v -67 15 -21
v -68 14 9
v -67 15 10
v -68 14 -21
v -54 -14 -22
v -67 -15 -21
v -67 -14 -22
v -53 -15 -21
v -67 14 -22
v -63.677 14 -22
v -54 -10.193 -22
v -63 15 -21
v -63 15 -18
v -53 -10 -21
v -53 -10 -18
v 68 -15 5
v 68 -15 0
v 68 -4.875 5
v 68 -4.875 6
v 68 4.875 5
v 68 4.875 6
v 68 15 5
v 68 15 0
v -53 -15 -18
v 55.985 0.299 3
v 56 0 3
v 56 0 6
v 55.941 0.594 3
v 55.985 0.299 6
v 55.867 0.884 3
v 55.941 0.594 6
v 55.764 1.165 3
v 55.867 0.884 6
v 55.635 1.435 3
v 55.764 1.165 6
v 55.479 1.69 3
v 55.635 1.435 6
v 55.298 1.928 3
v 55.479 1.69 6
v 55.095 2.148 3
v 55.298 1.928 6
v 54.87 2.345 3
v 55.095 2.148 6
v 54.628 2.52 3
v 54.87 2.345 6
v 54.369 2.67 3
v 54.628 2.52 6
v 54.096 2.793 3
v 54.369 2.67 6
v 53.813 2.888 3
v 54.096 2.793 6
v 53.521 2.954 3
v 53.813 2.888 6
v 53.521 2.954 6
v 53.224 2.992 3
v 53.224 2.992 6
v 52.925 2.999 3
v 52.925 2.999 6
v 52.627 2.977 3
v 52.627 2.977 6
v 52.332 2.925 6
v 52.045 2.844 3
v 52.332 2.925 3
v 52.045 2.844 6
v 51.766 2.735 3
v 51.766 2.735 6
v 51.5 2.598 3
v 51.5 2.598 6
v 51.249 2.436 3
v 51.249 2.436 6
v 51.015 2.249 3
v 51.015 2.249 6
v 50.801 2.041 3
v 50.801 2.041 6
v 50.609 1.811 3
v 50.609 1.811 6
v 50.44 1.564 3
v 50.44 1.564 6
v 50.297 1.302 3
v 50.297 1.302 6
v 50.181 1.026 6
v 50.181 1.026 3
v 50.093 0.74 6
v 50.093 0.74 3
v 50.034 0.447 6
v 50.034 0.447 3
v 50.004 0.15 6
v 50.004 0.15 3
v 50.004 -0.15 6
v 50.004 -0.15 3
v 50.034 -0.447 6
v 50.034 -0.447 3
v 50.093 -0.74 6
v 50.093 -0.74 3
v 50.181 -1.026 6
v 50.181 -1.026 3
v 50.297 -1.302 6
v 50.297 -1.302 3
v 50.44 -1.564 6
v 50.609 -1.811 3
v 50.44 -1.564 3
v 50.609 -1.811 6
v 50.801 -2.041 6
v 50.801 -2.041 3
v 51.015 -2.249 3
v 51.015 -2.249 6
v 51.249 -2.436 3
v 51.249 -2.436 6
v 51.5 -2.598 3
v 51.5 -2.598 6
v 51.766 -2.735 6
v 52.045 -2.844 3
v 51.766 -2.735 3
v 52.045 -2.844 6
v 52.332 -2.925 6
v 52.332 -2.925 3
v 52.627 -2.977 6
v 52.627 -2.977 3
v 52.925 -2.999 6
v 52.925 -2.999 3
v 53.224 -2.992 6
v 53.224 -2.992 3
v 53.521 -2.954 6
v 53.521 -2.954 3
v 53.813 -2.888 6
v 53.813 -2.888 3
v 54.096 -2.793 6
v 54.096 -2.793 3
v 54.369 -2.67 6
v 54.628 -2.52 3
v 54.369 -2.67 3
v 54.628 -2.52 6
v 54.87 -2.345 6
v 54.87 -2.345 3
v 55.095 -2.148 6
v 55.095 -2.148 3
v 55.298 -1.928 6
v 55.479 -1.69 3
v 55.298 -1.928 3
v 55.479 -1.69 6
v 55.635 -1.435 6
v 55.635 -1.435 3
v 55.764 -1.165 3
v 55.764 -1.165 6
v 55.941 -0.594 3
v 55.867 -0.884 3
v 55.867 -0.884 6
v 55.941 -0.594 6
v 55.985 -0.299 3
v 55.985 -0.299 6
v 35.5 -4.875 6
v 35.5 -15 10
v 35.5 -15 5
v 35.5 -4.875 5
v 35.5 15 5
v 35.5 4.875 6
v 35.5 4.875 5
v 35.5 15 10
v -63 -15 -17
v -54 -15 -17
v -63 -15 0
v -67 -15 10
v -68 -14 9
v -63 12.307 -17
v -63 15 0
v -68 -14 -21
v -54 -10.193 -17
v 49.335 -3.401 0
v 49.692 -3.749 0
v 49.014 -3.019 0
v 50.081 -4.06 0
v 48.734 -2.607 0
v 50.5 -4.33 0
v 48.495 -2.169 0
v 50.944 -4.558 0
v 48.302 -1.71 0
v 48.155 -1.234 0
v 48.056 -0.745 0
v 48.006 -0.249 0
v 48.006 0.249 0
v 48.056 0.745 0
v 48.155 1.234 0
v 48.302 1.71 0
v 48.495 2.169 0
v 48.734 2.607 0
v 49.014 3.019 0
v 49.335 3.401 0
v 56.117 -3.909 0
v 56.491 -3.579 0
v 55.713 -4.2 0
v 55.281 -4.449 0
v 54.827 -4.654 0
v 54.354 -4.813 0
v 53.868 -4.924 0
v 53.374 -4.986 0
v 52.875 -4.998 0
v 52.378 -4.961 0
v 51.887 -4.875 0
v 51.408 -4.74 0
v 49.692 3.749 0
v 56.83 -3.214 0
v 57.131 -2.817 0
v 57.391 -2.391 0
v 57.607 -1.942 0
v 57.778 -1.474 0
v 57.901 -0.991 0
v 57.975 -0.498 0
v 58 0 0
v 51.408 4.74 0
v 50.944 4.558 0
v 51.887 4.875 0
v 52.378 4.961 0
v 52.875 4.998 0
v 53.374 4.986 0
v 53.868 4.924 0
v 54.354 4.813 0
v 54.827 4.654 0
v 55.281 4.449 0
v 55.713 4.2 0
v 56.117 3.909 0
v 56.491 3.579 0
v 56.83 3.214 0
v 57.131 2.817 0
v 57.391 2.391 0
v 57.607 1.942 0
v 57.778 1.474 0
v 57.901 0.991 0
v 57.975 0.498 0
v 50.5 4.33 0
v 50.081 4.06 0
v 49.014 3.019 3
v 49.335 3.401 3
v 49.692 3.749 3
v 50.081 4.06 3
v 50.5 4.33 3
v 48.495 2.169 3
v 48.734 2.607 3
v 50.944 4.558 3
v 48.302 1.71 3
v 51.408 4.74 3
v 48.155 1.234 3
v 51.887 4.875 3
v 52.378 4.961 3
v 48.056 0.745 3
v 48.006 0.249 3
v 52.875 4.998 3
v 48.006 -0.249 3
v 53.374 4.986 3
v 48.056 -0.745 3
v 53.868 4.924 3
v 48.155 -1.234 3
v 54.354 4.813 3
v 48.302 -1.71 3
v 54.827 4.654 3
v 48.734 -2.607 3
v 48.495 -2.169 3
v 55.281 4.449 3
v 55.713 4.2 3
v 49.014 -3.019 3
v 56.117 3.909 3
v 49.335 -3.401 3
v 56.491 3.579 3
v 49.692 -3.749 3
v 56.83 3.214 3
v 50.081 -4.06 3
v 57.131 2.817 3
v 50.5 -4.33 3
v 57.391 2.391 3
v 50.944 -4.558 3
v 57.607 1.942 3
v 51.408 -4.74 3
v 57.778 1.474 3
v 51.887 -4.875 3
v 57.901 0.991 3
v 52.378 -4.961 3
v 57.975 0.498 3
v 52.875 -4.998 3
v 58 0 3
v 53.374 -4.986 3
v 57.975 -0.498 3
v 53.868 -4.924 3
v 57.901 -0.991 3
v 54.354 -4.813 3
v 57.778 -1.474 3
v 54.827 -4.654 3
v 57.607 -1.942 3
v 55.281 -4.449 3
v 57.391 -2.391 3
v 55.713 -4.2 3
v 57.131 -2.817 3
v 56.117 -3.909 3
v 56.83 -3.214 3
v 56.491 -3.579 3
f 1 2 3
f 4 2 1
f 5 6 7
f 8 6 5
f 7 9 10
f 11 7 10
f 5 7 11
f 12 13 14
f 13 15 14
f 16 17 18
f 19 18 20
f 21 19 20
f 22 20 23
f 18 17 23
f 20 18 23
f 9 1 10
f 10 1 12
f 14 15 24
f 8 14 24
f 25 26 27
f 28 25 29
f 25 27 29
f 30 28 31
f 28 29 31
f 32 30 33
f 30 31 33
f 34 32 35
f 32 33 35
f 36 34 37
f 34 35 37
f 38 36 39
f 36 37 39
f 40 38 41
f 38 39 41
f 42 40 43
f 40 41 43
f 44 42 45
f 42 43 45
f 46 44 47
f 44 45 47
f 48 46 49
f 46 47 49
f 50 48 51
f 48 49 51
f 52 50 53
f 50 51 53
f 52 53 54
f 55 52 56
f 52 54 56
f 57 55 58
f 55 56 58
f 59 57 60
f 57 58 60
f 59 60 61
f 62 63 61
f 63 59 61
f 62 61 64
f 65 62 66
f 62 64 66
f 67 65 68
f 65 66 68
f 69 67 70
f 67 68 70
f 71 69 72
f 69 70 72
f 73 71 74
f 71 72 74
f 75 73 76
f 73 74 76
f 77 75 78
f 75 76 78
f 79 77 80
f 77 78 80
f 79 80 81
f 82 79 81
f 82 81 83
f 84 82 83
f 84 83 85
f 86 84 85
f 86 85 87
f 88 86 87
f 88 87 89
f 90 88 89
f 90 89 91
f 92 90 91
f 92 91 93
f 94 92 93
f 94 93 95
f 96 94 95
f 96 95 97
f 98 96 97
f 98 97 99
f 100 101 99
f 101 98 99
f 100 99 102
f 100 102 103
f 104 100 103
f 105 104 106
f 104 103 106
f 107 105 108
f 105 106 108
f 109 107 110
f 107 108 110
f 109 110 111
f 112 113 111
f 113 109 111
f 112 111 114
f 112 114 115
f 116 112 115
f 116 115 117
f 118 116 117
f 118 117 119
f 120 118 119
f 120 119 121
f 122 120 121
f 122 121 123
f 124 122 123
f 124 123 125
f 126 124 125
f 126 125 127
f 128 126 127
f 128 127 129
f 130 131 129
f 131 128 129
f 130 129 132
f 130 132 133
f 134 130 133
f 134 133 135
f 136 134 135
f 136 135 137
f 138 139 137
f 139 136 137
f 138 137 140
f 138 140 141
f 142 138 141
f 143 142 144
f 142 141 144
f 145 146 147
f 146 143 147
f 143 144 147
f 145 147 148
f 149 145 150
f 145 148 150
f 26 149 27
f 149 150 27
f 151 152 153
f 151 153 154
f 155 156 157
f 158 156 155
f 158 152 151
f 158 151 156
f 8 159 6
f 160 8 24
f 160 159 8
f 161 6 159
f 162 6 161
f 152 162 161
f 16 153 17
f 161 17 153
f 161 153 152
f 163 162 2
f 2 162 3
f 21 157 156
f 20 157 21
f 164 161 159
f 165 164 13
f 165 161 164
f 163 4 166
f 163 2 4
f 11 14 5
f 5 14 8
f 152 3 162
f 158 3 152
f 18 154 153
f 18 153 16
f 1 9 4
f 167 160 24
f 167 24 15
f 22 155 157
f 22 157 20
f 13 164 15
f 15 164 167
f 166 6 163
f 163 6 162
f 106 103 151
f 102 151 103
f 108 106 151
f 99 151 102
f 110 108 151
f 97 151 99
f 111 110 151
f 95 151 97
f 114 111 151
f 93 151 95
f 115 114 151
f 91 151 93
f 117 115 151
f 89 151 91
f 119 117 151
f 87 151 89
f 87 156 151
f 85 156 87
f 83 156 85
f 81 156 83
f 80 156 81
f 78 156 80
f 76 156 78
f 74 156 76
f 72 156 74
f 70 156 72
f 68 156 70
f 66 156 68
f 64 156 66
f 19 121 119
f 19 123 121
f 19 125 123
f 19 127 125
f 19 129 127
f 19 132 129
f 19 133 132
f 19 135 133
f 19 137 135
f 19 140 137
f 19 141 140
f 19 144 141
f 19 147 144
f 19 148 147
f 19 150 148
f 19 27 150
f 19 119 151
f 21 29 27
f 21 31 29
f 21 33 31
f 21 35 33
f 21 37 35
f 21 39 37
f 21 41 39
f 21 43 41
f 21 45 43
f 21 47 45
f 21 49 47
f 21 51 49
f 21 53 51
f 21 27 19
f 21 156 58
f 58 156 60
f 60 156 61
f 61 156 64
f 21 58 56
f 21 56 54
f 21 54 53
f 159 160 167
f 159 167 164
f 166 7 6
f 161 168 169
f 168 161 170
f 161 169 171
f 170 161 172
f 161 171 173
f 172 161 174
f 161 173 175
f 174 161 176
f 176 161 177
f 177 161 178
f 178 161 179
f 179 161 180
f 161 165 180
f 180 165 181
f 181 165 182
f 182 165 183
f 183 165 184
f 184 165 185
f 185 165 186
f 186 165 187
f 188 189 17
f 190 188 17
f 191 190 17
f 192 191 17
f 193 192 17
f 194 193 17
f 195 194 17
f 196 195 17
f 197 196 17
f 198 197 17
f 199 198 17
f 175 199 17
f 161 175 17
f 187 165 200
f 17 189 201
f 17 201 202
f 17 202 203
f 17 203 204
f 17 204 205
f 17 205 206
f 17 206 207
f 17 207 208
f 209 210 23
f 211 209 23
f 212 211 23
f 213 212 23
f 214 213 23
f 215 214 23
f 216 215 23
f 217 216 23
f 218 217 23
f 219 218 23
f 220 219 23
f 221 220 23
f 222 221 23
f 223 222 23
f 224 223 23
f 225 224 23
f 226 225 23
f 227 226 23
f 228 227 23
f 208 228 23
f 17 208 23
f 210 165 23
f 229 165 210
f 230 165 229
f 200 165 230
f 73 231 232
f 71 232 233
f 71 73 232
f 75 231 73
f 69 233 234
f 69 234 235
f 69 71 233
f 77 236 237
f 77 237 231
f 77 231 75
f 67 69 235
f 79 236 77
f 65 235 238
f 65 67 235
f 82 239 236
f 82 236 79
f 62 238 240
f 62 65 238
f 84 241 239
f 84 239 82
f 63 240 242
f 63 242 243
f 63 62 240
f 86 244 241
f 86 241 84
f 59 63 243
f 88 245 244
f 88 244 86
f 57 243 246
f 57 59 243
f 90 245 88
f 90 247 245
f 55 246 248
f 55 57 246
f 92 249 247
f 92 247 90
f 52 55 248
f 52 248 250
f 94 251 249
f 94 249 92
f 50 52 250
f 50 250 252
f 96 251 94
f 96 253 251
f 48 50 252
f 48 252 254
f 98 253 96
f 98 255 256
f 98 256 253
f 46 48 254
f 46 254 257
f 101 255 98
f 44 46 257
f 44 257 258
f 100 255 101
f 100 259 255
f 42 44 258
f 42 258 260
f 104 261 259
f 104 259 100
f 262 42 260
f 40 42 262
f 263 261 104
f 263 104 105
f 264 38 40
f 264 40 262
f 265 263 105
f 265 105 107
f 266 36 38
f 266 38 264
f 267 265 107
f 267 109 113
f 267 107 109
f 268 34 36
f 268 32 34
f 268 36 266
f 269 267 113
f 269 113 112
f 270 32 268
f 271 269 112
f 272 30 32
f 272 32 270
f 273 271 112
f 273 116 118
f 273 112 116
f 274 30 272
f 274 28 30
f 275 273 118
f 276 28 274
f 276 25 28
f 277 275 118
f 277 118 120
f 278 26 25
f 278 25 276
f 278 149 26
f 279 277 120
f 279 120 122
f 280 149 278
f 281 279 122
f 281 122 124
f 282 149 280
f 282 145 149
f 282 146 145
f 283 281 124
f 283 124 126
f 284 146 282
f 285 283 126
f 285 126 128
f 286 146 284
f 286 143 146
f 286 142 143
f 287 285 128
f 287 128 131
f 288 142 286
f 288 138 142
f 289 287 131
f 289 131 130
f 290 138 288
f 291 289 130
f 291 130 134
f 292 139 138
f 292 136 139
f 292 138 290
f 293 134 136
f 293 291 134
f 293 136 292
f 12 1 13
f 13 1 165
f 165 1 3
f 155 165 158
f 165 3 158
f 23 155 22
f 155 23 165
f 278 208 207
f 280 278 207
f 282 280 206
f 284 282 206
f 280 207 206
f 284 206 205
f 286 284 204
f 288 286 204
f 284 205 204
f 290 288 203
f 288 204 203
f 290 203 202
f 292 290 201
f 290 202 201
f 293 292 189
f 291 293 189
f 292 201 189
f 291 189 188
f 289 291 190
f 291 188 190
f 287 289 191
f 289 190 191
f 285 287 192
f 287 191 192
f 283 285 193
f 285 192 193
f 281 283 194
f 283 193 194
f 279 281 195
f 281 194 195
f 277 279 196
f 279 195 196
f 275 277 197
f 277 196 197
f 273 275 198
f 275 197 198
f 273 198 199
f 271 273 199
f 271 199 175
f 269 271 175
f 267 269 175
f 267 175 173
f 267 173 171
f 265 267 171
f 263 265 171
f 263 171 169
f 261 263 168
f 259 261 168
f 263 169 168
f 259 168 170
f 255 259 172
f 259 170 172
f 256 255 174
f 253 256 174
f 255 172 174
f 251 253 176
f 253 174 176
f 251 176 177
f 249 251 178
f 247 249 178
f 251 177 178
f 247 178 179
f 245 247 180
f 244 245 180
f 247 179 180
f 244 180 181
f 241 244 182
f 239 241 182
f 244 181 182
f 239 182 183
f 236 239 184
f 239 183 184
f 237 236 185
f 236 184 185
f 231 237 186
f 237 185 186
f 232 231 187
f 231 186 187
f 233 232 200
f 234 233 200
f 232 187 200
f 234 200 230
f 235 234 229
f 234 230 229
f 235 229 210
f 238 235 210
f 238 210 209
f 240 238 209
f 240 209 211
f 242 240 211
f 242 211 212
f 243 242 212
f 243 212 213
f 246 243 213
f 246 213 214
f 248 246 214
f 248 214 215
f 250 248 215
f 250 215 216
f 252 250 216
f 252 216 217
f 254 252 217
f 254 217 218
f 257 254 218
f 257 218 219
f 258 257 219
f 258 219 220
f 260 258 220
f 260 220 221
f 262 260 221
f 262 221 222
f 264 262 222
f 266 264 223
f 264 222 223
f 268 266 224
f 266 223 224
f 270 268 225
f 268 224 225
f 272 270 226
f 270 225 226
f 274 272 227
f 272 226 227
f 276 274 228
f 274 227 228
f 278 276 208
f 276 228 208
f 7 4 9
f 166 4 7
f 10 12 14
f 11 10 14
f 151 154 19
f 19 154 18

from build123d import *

# Parameters (mm, degrees)
SKETCH033_W     = 136
SKETCH033_H     = 30
PAD012_DEPTH    = 10
SKETCH032_W     = 15
SKETCH032_H     = 30
PAD011_DEPTH    = 22
SKETCH030_W     = 30
SKETCH030_H     = 17
POCKET020_DEPTH = 10
SKETCH031_R     = 3
POCKET021_DEPTH = 10.001
SKETCH034_W     = 32.5
SKETCH034_H     = 30
POCKET022_DEPTH = 5
SKETCH040_R     = 5
POCKET028_DEPTH = 3
CHAMFER_SIZE2   = 25
CHAMFER_SIZE    = 10
CHAMFER010_SIZE = 1
SKETCH080_W     = 32.5
SKETCH080_H     = 9.75
PAD031_DEPTH    = 1
SKETCH084_R     = 3
POCKET051_DEPTH = 5


with BuildPart() as part:
    # Sketch033 → Pad012 (new body)
    with BuildSketch(Plane.XY):
        Rectangle(SKETCH033_W, SKETCH033_H)
    extrude(amount=PAD012_DEPTH)

    # Sketch032 (on Face5 of Pad012) → Pad011 (join)
    with BuildSketch(Plane(origin=(0, 0, 0), x_dir=(1, 0, 0), z_dir=(0, 0, -1))):
        with Locations((-60.5, 0)):
            Rectangle(SKETCH032_W, SKETCH032_H)
    extrude(amount=PAD011_DEPTH)

    # Sketch030 (on Face9 of Pad011) → Pocket020 (cut)
    with BuildSketch(Plane.YZ.offset(-53)):
        with Locations((0, -8.5)):
            Rectangle(SKETCH030_W, SKETCH030_H)
    extrude(amount=-POCKET020_DEPTH, mode=Mode.SUBTRACT)

    # Sketch031 (on Face5 of Pocket020) → Pocket021 (cut, through all)
    with BuildSketch(Plane(origin=(0, 0, 0), x_dir=(1, 0, 0), z_dir=(0, 0, -1))):
        with Locations((53, 0)):
            Circle(SKETCH031_R)
    extrude(amount=-POCKET021_DEPTH, mode=Mode.SUBTRACT)

    # Sketch034 → Pocket022 (cut)
    with BuildSketch(Plane.XY.offset(10)):
        with Locations((51.75, 0)):
            Rectangle(SKETCH034_W, SKETCH034_H)
    extrude(amount=-POCKET022_DEPTH, mode=Mode.SUBTRACT)

    # Sketch040 (on Face4 of Pocket022) → Pocket028 (cut)
    with BuildSketch(Plane(origin=(0, 0, 0), x_dir=(1, 0, 0), z_dir=(0, 0, -1))):
        with Locations((53, 0)):
            Circle(SKETCH040_R)
    extrude(amount=-POCKET028_DEPTH, mode=Mode.SUBTRACT)

    # Chamfer
    chamfer_edges = [part.edges().sort_by_distance(p)[0] for p in [
        (-53, 15, -19.5),
    ]]
    chamfer_side = part.faces().sort_by_distance((-63.15625, 15, -13.65625))[0]
    chamfer(chamfer_edges, length=CHAMFER_SIZE, length2=CHAMFER_SIZE2, reference=chamfer_side)

    # Chamfer010
    chamfer010_edges = [part.edges().sort_by_distance(p)[0] for p in [
        (-58, 2.5, -22),
        (-58, 2.5, -17),
        (-53, -12.5, -22),
        (-53, -12.5, -17),
        (-60.5, -15, -22),
        (-68, 0, -22),
        (-65.5, 15, -22),
        (-68, -15, -11),
        (-68, -15, 5),
        (-68, 0, 10),
        (-68, 15, 5),
        (-68, 15, -11),
    ]]
    chamfer(chamfer010_edges, length=CHAMFER010_SIZE)

    # Sketch080 (on Face21 of Chamfer010) → Pad031 (join)
    with BuildSketch(Plane.XY.offset(5)):
        with Locations((51.75, 0)):
            Rectangle(SKETCH080_W, SKETCH080_H)
    extrude(amount=PAD031_DEPTH)

    # Sketch084 (on Face33 of Pad031) → Pocket051 (cut)
    with BuildSketch(Plane.XY.offset(6)):
        with Locations((53, 0)):
            Circle(SKETCH084_R)
    extrude(amount=-POCKET051_DEPTH, mode=Mode.SUBTRACT)


solid = part.part
